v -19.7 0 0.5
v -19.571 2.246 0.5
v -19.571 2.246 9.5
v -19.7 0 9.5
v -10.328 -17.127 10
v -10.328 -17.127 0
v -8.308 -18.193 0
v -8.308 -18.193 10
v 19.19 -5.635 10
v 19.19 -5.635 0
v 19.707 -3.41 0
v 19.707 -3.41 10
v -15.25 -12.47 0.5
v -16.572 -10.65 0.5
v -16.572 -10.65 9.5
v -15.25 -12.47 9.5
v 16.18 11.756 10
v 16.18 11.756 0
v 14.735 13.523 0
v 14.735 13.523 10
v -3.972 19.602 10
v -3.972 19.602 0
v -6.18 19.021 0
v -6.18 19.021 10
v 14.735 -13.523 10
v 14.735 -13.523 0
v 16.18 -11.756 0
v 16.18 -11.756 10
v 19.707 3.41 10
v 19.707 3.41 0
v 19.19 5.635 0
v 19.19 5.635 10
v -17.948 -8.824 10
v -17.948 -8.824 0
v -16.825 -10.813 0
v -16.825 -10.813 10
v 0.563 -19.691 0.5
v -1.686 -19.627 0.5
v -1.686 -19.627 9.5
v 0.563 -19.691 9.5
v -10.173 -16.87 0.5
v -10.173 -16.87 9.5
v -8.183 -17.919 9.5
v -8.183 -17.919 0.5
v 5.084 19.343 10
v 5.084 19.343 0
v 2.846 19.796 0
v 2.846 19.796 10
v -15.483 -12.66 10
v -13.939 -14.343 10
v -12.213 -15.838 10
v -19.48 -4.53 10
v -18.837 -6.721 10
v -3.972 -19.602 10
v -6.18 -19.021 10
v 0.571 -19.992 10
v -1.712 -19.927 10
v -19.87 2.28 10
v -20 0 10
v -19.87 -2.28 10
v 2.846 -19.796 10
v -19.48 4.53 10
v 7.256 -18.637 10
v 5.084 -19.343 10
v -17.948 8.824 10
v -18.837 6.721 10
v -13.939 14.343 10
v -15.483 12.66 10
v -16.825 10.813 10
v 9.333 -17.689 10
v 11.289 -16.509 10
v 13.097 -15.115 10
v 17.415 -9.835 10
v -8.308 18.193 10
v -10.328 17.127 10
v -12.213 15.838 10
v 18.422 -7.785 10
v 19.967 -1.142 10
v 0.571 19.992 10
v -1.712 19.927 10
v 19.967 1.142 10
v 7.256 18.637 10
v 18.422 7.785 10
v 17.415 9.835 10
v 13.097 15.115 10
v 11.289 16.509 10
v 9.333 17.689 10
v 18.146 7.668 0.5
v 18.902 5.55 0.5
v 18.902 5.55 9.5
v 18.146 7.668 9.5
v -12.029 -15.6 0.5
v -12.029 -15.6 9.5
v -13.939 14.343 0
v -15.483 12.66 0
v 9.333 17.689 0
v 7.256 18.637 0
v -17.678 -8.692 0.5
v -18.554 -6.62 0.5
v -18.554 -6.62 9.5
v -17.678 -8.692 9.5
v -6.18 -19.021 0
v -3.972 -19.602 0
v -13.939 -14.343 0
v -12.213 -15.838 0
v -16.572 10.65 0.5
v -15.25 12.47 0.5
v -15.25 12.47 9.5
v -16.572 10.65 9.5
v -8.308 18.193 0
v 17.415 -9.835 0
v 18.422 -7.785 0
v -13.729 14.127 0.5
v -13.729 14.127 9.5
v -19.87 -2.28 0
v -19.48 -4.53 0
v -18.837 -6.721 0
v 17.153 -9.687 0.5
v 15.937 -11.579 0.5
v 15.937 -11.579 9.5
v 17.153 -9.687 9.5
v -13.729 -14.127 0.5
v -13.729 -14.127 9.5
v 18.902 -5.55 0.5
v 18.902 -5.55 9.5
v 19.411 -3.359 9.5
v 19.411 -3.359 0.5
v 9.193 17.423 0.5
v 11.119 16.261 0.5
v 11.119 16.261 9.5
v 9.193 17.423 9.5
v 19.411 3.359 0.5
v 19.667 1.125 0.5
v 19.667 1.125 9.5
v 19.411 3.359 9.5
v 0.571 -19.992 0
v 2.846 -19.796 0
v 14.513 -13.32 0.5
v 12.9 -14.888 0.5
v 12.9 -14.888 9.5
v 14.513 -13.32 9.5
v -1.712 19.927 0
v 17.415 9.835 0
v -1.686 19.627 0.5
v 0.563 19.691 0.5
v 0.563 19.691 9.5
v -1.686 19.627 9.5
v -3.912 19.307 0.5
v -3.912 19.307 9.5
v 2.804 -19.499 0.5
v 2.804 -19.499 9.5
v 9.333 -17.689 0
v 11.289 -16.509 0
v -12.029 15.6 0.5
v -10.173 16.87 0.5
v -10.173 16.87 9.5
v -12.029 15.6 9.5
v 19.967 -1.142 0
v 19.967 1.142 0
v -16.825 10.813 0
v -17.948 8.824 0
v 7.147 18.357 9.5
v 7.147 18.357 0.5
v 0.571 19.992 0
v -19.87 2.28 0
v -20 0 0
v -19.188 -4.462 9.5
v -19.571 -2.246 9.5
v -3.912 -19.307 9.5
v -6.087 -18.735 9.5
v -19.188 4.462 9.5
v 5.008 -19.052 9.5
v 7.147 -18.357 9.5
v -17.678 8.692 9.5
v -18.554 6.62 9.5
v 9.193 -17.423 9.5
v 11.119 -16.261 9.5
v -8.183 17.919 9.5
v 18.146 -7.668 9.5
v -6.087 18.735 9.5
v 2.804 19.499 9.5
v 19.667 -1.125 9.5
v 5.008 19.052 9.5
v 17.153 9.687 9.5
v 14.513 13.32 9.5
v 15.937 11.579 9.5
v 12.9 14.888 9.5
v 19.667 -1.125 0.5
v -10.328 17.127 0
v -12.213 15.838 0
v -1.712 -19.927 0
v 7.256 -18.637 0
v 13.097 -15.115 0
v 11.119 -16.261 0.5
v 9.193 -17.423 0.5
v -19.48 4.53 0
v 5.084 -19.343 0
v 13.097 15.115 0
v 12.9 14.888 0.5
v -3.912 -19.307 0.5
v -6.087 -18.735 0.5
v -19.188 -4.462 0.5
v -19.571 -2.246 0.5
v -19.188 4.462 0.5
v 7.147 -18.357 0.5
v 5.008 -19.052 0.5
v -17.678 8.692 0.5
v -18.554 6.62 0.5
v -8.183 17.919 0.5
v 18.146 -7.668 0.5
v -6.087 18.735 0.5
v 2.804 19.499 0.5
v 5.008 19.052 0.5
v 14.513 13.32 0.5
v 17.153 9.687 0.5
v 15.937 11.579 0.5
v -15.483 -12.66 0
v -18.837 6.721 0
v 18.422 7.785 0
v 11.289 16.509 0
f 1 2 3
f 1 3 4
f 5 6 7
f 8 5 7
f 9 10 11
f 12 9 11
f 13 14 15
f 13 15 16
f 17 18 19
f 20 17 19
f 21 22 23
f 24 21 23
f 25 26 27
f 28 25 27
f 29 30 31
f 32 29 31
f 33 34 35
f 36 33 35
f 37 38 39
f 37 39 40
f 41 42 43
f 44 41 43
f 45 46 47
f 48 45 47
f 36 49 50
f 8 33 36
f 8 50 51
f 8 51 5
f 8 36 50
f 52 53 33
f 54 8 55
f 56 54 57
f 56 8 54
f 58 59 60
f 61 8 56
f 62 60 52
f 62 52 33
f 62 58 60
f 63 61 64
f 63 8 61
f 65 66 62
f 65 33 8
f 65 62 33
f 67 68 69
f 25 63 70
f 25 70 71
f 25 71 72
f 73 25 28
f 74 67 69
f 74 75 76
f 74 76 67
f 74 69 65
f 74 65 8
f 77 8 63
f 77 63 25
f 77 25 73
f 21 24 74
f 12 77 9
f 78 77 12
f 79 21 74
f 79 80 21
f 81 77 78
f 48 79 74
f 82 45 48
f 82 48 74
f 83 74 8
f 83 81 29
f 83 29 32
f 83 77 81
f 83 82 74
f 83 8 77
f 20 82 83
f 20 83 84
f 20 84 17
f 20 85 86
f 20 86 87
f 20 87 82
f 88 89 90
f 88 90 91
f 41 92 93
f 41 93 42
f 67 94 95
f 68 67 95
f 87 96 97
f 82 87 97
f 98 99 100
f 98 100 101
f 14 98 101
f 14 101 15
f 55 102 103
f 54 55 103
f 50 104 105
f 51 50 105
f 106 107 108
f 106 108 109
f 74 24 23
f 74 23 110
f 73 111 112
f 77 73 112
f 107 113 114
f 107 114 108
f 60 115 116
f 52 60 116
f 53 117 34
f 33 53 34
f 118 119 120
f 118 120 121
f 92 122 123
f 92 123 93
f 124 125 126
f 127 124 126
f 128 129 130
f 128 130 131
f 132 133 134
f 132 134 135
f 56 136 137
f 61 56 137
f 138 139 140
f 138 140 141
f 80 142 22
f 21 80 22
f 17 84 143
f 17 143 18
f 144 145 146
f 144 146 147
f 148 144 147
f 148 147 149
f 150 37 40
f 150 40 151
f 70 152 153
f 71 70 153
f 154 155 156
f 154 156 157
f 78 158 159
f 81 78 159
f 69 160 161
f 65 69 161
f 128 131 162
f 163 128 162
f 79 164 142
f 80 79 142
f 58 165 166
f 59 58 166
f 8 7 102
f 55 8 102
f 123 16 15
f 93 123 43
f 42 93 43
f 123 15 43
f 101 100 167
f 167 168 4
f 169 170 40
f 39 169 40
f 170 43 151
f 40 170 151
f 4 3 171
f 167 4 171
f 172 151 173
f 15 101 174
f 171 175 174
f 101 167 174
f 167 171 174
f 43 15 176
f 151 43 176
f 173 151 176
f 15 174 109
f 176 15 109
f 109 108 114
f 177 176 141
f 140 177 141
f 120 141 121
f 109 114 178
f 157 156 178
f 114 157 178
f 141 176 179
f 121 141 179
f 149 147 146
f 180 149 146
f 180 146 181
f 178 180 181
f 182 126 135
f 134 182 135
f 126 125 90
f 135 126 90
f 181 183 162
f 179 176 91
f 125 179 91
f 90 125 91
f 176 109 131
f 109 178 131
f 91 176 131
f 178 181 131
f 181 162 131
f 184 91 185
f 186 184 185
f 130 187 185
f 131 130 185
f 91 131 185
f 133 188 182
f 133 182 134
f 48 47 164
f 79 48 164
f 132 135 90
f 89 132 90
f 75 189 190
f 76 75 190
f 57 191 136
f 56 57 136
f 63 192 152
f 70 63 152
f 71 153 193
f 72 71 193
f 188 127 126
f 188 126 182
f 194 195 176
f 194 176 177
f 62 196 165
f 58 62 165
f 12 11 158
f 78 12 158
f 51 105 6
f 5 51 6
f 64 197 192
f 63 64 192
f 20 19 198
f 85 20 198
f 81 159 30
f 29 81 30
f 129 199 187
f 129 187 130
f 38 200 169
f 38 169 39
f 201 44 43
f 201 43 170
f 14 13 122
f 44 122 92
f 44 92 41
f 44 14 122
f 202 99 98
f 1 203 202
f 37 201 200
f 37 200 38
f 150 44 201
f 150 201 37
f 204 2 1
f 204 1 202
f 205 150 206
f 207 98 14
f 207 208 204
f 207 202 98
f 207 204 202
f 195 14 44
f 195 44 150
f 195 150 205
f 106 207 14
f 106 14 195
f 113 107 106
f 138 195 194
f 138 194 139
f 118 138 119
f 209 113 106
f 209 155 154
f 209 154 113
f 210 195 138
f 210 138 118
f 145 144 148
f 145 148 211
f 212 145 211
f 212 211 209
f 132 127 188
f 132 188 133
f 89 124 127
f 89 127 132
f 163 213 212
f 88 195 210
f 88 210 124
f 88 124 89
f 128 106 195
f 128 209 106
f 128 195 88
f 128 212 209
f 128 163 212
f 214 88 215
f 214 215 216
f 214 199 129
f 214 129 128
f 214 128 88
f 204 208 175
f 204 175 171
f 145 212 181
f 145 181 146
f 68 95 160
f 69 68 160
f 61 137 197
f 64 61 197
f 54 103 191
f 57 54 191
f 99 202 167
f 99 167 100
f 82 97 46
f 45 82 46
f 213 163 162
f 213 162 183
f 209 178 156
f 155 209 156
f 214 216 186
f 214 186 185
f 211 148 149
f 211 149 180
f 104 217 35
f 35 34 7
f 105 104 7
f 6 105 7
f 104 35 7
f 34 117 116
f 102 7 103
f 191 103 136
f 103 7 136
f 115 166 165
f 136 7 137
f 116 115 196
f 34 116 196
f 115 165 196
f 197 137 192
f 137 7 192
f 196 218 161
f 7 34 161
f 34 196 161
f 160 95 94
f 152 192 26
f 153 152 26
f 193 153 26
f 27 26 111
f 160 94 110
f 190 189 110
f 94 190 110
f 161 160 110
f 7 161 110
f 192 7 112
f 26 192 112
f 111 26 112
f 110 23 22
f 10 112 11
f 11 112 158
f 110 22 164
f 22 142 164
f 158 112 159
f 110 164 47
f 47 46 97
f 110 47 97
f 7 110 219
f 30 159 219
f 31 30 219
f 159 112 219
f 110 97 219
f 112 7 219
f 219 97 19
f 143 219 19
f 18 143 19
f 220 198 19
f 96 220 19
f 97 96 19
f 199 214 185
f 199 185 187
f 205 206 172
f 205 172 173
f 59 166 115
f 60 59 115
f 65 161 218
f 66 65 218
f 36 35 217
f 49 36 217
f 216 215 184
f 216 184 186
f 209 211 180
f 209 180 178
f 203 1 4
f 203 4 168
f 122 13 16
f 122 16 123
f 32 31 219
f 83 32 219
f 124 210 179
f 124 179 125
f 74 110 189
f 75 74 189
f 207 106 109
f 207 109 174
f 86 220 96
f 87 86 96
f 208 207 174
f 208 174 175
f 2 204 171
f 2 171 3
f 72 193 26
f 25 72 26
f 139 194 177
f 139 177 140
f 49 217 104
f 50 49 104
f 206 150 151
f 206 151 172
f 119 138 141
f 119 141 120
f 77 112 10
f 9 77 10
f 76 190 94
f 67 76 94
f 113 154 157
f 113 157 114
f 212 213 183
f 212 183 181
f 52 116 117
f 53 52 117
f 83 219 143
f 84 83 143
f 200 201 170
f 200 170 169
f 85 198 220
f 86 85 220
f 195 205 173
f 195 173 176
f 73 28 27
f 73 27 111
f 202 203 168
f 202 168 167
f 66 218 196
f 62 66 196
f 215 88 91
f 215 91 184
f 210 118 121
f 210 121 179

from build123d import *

# Parameters (mm, degrees)
TH_N_NGO_I_DEPTH      = 10
KHOANG_START          = 0.5
KHOANG_R_NG_K_N_DEPTH = 9


with BuildPart() as part:
    # Biên dạng ngoài theo phôi gốc → Thân ngoài (new body)
    with BuildSketch(Plane.XY):
        Polygon((-20, 0), (-19.869634628, -2.279828072), (-19.480237961, -4.52993536), (-18.83688736, -6.720988274), (-17.947967529, -8.824421883), (-16.825069428, -10.81281662), (-15.482831955, -12.66024971), (-13.938751221, -14.342636108), (-12.212957382, -15.83804512), (-10.327949524, -17.126981735), (-8.308300018, -18.192638397), (-6.180339813, -19.021131515), (-3.971809387, -19.601652145), (-1.711500168, -19.926635742), (0.571121037, -19.991844177), (2.846296787, -19.79642868), (5.084366798, -19.34293747), (7.25615406, -18.637279511), (9.333346367, -17.688657761), (11.288864136, -16.509437561), (13.097214699, -15.114992142), (14.734822273, -13.523497581), (16.180339813, -11.75570488), (17.414920807, -9.834658623), (18.422472, -7.785401821), (19.18985939, -5.634651184), (19.707077026, -3.410444021), (19.967382431, -1.141776204), (19.967382431, 1.141776204), (19.707077026, 3.410444021), (19.18985939, 5.634651184), (18.422472, 7.785401821), (17.414920807, 9.834658623), (16.180339813, 11.75570488), (14.734822273, 13.523497581), (13.097214699, 15.114992142), (11.288864136, 16.509437561), (9.333346367, 17.688657761), (7.25615406, 18.637279511), (5.084366798, 19.34293747), (2.846296787, 19.79642868), (0.571121037, 19.991844177), (-1.711500168, 19.926635742), (-3.971809387, 19.601652145), (-6.180339813, 19.021131515), (-8.308300018, 18.192638397), (-10.327949524, 17.126981735), (-12.212957382, 15.83804512), (-13.938751221, 14.342636108), (-15.482831955, 12.66024971), (-16.825069428, 10.81281662), (-17.947967529, 8.824421883), (-18.83688736, 6.720988274), (-19.480237961, 4.52993536), (-19.869634628, 2.279828072), align=None)
    extrude(amount=TH_N_NGO_I_DEPTH)

    # Biên dạng trong cách thành ngoài 0,3 mm → Khoang rỗng kín (cut)
    with BuildSketch(Plane.XY.offset(KHOANG_START)):
        Polygon((-19.57110405, -2.245574713), (-19.187557221, -4.461875439), (-18.553873062, -6.620008946), (-17.678308487, -8.691839218), (-16.572280884, -10.650359154), (-15.250209808, -12.470035553), (-13.729328155, -14.127144813), (-12.029463768, -15.600086212), (-10.172777176, -16.869657516), (-8.18347168, -17.919303894), (-6.087482929, -18.735347748), (-3.912134886, -19.30714798), (-1.68578577, -19.627248764), (0.562540114, -19.691476822), (2.8035326, -19.498996735), (5.007976532, -19.052318573), (7.147133827, -18.357263565), (9.193117142, -17.422893524), (11.119255066, -16.261390686), (12.900435448, -14.887896538), (14.513439179, -13.320313454), (15.937238693, -11.579081535), (17.153270721, -9.686898232), (18.145683289, -7.668429852), (18.901540756, -5.549993038), (19.410987854, -3.359203815), (19.667383194, -1.12462163), (19.667383194, 1.12462163), (19.410987854, 3.359203815), (18.901540756, 5.549993038), (18.145683289, 7.668429852), (17.153270721, 9.686898232), (15.937238693, 11.579081535), (14.513439179, 13.320313454), (12.900435448, 14.887896538), (11.119255066, 16.261390686), (9.193117142, 17.422893524), (7.147133827, 18.357263565), (5.007976532, 19.052318573), (2.8035326, 19.498996735), (0.562540114, 19.691476822), (-1.68578577, 19.627248764), (-3.912134886, 19.30714798), (-6.087482929, 18.735347748), (-8.18347168, 17.919303894), (-10.172777176, 16.869657516), (-12.029463768, 15.600086212), (-13.729328155, 14.127144813), (-15.250209808, 12.470035553), (-16.572280884, 10.650359154), (-17.678308487, 8.691839218), (-18.553873062, 6.620008946), (-19.187557221, 4.461875439), (-19.57110405, 2.245574713), (-19.699510574, 0), align=None)
    extrude(amount=KHOANG_R_NG_K_N_DEPTH, mode=Mode.SUBTRACT)


solid = part.part
